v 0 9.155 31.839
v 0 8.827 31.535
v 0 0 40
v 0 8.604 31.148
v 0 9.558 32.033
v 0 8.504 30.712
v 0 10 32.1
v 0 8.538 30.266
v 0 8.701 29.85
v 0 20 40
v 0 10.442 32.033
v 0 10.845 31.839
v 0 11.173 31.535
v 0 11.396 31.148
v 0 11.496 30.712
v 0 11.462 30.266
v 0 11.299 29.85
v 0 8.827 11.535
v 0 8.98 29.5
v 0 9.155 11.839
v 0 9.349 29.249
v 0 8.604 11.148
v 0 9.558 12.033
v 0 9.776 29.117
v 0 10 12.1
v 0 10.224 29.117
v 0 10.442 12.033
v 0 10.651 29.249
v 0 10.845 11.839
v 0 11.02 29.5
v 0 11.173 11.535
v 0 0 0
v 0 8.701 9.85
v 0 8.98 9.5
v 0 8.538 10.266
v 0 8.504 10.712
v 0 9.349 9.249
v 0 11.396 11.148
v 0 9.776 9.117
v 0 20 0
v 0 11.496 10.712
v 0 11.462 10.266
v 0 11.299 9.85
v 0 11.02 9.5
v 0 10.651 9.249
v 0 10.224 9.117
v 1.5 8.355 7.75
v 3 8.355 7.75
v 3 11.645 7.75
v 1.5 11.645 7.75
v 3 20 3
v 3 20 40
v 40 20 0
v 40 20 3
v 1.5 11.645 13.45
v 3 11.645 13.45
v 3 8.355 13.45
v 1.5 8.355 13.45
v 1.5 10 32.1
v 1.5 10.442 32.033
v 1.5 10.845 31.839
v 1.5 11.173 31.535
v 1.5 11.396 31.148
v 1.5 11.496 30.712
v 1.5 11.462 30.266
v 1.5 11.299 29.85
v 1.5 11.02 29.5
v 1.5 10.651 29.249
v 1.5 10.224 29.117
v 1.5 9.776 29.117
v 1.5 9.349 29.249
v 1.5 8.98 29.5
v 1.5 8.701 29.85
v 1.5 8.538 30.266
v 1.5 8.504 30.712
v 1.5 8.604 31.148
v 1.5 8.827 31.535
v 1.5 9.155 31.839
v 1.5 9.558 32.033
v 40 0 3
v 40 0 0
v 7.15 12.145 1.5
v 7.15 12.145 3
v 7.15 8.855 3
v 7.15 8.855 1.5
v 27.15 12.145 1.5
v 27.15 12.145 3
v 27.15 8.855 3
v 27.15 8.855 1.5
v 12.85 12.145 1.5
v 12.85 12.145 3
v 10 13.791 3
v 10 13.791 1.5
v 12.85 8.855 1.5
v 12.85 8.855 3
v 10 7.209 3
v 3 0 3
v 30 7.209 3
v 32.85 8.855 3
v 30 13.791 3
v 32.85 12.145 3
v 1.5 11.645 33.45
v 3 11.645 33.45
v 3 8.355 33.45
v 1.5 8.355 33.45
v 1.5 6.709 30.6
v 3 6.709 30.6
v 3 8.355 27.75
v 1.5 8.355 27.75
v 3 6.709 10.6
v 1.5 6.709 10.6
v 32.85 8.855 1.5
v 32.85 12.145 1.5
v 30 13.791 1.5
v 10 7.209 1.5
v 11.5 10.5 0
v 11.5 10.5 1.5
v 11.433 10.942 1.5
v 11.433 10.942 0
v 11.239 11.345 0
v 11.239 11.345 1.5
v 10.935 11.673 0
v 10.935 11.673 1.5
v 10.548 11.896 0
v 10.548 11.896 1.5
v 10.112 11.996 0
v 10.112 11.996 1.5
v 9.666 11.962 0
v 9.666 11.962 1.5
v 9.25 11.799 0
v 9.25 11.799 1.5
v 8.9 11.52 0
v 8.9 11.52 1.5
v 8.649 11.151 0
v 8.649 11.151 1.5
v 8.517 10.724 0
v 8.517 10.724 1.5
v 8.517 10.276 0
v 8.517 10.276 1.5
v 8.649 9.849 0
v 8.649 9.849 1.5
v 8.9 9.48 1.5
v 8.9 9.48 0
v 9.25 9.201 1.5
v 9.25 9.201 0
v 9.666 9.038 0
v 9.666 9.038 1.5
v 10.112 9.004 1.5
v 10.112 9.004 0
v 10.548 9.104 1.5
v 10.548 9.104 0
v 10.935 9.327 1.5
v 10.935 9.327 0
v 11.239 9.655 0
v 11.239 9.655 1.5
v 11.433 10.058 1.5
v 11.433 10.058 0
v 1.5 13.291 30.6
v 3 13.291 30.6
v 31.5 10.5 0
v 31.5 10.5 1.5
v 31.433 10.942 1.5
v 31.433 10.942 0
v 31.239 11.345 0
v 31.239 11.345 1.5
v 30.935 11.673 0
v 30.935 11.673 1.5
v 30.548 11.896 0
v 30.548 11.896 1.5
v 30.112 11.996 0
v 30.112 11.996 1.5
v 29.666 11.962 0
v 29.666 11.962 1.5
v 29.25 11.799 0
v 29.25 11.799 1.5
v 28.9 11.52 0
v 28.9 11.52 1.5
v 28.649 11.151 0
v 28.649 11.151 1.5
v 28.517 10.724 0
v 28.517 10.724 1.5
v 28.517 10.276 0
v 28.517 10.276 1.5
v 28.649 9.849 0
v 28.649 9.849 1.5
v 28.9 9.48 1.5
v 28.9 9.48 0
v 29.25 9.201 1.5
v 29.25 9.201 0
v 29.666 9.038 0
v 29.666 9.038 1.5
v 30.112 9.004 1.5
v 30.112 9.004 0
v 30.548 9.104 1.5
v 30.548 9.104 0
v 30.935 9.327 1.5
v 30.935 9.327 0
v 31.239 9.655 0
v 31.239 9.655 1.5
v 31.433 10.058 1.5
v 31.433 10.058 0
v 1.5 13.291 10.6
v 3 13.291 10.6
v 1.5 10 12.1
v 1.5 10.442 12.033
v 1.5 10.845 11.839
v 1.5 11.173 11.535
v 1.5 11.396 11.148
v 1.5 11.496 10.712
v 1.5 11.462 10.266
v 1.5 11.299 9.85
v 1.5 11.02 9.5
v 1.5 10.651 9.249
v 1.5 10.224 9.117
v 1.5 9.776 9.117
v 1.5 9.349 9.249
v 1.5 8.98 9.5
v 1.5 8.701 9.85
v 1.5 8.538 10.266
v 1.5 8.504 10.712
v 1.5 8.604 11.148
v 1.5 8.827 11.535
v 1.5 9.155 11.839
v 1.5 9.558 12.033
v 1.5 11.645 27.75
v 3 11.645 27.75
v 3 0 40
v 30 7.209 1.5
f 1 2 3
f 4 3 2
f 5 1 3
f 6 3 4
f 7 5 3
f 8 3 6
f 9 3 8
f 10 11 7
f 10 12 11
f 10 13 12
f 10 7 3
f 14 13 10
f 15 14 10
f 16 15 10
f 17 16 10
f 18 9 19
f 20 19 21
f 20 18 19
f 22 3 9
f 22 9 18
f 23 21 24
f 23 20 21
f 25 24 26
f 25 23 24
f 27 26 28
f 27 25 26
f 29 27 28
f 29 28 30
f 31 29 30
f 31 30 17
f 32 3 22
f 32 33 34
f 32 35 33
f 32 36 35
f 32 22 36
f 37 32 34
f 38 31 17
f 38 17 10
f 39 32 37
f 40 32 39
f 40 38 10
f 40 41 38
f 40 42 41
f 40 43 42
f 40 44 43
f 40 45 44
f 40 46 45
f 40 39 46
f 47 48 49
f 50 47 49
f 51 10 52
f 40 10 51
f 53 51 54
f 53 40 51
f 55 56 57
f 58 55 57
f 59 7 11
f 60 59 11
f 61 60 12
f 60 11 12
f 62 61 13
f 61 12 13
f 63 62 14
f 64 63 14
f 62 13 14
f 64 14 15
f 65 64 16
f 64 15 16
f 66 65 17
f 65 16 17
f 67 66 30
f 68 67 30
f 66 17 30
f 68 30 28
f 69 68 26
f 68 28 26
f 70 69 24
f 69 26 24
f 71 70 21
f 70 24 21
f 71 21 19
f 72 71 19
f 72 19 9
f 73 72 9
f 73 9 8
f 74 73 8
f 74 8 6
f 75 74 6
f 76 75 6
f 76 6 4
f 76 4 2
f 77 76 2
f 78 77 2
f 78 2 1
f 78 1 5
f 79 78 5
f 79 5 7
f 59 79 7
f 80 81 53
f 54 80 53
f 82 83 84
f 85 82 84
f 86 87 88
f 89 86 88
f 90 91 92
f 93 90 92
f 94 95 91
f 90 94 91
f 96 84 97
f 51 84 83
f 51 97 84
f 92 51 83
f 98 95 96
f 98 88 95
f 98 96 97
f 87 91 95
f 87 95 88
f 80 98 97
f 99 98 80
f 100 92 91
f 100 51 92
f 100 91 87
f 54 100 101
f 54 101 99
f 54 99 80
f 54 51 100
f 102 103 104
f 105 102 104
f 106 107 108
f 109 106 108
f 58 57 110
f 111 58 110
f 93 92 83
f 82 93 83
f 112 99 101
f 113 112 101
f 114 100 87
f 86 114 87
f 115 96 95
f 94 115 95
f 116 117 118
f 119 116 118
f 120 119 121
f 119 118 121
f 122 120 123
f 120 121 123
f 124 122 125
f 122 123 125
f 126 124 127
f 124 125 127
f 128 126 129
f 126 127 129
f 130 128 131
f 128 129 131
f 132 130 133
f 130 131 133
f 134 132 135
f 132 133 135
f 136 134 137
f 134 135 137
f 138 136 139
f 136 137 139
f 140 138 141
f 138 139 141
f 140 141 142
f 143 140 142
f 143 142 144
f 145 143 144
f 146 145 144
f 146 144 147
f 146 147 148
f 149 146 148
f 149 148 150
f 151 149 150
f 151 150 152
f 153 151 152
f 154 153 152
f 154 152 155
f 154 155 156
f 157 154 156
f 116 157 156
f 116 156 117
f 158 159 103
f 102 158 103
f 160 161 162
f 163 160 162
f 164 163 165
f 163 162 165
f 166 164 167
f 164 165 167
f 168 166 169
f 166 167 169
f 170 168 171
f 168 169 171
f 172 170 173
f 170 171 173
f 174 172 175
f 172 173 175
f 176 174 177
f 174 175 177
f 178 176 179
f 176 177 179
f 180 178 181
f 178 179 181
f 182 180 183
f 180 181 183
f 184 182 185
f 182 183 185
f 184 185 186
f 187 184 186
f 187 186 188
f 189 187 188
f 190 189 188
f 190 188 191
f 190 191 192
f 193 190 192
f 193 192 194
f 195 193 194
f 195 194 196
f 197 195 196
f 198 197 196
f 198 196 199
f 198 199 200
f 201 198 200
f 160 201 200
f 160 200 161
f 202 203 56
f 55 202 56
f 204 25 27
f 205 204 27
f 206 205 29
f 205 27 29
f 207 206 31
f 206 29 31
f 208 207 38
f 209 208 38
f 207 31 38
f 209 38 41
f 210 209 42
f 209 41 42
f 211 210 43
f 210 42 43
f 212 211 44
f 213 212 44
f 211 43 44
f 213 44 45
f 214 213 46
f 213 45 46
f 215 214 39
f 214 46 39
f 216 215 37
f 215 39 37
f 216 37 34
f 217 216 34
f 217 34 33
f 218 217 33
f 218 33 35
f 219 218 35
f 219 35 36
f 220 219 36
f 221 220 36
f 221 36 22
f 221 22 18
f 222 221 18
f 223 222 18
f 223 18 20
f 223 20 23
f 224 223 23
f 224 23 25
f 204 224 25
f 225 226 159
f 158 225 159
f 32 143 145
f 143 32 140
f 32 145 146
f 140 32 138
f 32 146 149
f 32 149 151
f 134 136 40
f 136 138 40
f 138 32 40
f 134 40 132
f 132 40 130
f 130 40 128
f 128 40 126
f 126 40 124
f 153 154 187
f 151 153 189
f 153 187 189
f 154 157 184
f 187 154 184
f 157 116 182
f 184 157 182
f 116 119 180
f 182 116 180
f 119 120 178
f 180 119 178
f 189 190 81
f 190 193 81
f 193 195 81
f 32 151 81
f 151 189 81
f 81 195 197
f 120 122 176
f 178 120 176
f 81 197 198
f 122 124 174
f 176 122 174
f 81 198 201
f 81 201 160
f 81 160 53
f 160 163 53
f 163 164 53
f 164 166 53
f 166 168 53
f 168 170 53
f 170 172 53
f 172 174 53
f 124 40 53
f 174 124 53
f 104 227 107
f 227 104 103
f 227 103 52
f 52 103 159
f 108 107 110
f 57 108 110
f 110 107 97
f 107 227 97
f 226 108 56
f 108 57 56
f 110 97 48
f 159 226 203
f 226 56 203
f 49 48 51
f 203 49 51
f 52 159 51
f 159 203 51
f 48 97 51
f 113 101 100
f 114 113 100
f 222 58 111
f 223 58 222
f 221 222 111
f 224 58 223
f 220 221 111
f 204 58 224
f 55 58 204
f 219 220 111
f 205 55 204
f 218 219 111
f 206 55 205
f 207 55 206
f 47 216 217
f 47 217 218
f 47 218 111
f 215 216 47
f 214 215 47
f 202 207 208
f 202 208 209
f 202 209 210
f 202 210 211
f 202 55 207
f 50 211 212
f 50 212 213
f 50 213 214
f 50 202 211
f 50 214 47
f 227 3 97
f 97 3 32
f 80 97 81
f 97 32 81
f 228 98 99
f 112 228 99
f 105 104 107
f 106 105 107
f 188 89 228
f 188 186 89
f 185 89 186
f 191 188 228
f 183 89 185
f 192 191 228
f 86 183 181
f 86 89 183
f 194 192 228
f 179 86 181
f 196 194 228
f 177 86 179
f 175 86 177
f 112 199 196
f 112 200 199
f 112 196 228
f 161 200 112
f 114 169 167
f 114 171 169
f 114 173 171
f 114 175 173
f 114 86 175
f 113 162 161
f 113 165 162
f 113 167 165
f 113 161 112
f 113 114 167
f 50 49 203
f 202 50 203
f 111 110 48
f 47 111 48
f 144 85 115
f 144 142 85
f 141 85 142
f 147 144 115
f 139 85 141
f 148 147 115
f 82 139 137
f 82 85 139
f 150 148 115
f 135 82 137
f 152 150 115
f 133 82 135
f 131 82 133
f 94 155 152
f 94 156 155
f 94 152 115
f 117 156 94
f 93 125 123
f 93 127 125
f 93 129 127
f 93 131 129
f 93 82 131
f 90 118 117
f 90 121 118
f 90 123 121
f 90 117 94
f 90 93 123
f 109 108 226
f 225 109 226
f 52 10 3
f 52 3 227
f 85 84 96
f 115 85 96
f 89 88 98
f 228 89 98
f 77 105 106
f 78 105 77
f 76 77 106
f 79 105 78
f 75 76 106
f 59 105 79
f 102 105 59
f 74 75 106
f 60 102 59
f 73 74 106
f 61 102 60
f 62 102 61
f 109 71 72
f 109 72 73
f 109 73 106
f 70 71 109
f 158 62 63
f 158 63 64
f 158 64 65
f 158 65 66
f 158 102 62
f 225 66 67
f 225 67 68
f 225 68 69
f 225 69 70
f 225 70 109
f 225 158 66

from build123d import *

# Parameters (mm, degrees)
ESQUISSE1_W             = 40
ESQUISSE1_H             = 20
BOSS_EXTRU_1_DEPTH      = 3
ESQUISSE2_R             = 1.5
ENL_V_MAT_EXTRU_1_DEPTH = 3
ESQUISSE3_W             = 3
ESQUISSE3_H             = 20
BOSS_EXTRU_2_DEPTH      = 37
ESQUISSE4_R             = 1.5
ENL_V_MAT_EXTRU_2_DEPTH = 3
ENL_V_MAT_EXTRU_3_DEPTH = 1.5
ENL_V_MAT_EXTRU_4_DEPTH = 1.5


with BuildPart() as part:
    # Esquisse1 → Boss.-Extru.1 (new body)
    with BuildSketch(Plane.XY):
        with Locations((20, 10)):
            Rectangle(ESQUISSE1_W, ESQUISSE1_H)
    extrude(amount=BOSS_EXTRU_1_DEPTH)

    # Esquisse2 → Enlèv. mat.-Extru.1 (cut)
    with BuildSketch(Plane.XY.offset(3)):
        with Locations((10, 10.5)):
            Circle(ESQUISSE2_R)
        with Locations((30, 10.5)):
            Circle(ESQUISSE2_R)
    extrude(amount=-ENL_V_MAT_EXTRU_1_DEPTH, mode=Mode.SUBTRACT)

    # Esquisse3 → Boss.-Extru.2 (add)
    with BuildSketch(Plane.XY.offset(3)):
        with Locations((1.5, 10)):
            Rectangle(ESQUISSE3_W, ESQUISSE3_H)
    extrude(amount=BOSS_EXTRU_2_DEPTH)

    # Esquisse4 → Enlèv. mat.-Extru.2 (cut)
    with BuildSketch(Plane.ZY):
        with Locations((10.6, 10)):
            Circle(ESQUISSE4_R)
        with Locations((30.6, 10)):
            Circle(ESQUISSE4_R)
    extrude(amount=-ENL_V_MAT_EXTRU_2_DEPTH, mode=Mode.SUBTRACT)

    # Esquisse5 → Enlèv. mat.-Extru.3 (cut)
    with BuildSketch(Plane(origin=(3, 0, 0), x_dir=(0, 0, -1), z_dir=(1, 0, 0))):
        Polygon((-13.45, 8.354551733), (-10.6, 6.709103466), (-7.75, 8.354551733), (-7.75, 11.645448267), (-10.6, 13.290896534), (-13.45, 11.645448267), align=None)
        Polygon((-30.6, 6.709103466), (-27.75, 8.354551733), (-27.75, 11.645448267), (-30.6, 13.290896534), (-33.45, 11.645448267), (-33.45, 8.354551733), align=None)
    extrude(amount=-ENL_V_MAT_EXTRU_3_DEPTH, mode=Mode.SUBTRACT)

    # Esquisse6 → Enlèv. mat.-Extru.4 (cut)
    with BuildSketch(Plane.XY.offset(3)):
        Polygon((27.15, 8.854551733), (30, 7.209103466), (32.85, 8.854551733), (32.85, 12.145448267), (30, 13.790896534), (27.15, 12.145448267), align=None)
        Polygon((10, 7.209103466), (12.85, 8.854551733), (12.85, 12.145448267), (10, 13.790896534), (7.15, 12.145448267), (7.15, 8.854551733), align=None)
    extrude(amount=-ENL_V_MAT_EXTRU_4_DEPTH, mode=Mode.SUBTRACT)


solid = part.part
